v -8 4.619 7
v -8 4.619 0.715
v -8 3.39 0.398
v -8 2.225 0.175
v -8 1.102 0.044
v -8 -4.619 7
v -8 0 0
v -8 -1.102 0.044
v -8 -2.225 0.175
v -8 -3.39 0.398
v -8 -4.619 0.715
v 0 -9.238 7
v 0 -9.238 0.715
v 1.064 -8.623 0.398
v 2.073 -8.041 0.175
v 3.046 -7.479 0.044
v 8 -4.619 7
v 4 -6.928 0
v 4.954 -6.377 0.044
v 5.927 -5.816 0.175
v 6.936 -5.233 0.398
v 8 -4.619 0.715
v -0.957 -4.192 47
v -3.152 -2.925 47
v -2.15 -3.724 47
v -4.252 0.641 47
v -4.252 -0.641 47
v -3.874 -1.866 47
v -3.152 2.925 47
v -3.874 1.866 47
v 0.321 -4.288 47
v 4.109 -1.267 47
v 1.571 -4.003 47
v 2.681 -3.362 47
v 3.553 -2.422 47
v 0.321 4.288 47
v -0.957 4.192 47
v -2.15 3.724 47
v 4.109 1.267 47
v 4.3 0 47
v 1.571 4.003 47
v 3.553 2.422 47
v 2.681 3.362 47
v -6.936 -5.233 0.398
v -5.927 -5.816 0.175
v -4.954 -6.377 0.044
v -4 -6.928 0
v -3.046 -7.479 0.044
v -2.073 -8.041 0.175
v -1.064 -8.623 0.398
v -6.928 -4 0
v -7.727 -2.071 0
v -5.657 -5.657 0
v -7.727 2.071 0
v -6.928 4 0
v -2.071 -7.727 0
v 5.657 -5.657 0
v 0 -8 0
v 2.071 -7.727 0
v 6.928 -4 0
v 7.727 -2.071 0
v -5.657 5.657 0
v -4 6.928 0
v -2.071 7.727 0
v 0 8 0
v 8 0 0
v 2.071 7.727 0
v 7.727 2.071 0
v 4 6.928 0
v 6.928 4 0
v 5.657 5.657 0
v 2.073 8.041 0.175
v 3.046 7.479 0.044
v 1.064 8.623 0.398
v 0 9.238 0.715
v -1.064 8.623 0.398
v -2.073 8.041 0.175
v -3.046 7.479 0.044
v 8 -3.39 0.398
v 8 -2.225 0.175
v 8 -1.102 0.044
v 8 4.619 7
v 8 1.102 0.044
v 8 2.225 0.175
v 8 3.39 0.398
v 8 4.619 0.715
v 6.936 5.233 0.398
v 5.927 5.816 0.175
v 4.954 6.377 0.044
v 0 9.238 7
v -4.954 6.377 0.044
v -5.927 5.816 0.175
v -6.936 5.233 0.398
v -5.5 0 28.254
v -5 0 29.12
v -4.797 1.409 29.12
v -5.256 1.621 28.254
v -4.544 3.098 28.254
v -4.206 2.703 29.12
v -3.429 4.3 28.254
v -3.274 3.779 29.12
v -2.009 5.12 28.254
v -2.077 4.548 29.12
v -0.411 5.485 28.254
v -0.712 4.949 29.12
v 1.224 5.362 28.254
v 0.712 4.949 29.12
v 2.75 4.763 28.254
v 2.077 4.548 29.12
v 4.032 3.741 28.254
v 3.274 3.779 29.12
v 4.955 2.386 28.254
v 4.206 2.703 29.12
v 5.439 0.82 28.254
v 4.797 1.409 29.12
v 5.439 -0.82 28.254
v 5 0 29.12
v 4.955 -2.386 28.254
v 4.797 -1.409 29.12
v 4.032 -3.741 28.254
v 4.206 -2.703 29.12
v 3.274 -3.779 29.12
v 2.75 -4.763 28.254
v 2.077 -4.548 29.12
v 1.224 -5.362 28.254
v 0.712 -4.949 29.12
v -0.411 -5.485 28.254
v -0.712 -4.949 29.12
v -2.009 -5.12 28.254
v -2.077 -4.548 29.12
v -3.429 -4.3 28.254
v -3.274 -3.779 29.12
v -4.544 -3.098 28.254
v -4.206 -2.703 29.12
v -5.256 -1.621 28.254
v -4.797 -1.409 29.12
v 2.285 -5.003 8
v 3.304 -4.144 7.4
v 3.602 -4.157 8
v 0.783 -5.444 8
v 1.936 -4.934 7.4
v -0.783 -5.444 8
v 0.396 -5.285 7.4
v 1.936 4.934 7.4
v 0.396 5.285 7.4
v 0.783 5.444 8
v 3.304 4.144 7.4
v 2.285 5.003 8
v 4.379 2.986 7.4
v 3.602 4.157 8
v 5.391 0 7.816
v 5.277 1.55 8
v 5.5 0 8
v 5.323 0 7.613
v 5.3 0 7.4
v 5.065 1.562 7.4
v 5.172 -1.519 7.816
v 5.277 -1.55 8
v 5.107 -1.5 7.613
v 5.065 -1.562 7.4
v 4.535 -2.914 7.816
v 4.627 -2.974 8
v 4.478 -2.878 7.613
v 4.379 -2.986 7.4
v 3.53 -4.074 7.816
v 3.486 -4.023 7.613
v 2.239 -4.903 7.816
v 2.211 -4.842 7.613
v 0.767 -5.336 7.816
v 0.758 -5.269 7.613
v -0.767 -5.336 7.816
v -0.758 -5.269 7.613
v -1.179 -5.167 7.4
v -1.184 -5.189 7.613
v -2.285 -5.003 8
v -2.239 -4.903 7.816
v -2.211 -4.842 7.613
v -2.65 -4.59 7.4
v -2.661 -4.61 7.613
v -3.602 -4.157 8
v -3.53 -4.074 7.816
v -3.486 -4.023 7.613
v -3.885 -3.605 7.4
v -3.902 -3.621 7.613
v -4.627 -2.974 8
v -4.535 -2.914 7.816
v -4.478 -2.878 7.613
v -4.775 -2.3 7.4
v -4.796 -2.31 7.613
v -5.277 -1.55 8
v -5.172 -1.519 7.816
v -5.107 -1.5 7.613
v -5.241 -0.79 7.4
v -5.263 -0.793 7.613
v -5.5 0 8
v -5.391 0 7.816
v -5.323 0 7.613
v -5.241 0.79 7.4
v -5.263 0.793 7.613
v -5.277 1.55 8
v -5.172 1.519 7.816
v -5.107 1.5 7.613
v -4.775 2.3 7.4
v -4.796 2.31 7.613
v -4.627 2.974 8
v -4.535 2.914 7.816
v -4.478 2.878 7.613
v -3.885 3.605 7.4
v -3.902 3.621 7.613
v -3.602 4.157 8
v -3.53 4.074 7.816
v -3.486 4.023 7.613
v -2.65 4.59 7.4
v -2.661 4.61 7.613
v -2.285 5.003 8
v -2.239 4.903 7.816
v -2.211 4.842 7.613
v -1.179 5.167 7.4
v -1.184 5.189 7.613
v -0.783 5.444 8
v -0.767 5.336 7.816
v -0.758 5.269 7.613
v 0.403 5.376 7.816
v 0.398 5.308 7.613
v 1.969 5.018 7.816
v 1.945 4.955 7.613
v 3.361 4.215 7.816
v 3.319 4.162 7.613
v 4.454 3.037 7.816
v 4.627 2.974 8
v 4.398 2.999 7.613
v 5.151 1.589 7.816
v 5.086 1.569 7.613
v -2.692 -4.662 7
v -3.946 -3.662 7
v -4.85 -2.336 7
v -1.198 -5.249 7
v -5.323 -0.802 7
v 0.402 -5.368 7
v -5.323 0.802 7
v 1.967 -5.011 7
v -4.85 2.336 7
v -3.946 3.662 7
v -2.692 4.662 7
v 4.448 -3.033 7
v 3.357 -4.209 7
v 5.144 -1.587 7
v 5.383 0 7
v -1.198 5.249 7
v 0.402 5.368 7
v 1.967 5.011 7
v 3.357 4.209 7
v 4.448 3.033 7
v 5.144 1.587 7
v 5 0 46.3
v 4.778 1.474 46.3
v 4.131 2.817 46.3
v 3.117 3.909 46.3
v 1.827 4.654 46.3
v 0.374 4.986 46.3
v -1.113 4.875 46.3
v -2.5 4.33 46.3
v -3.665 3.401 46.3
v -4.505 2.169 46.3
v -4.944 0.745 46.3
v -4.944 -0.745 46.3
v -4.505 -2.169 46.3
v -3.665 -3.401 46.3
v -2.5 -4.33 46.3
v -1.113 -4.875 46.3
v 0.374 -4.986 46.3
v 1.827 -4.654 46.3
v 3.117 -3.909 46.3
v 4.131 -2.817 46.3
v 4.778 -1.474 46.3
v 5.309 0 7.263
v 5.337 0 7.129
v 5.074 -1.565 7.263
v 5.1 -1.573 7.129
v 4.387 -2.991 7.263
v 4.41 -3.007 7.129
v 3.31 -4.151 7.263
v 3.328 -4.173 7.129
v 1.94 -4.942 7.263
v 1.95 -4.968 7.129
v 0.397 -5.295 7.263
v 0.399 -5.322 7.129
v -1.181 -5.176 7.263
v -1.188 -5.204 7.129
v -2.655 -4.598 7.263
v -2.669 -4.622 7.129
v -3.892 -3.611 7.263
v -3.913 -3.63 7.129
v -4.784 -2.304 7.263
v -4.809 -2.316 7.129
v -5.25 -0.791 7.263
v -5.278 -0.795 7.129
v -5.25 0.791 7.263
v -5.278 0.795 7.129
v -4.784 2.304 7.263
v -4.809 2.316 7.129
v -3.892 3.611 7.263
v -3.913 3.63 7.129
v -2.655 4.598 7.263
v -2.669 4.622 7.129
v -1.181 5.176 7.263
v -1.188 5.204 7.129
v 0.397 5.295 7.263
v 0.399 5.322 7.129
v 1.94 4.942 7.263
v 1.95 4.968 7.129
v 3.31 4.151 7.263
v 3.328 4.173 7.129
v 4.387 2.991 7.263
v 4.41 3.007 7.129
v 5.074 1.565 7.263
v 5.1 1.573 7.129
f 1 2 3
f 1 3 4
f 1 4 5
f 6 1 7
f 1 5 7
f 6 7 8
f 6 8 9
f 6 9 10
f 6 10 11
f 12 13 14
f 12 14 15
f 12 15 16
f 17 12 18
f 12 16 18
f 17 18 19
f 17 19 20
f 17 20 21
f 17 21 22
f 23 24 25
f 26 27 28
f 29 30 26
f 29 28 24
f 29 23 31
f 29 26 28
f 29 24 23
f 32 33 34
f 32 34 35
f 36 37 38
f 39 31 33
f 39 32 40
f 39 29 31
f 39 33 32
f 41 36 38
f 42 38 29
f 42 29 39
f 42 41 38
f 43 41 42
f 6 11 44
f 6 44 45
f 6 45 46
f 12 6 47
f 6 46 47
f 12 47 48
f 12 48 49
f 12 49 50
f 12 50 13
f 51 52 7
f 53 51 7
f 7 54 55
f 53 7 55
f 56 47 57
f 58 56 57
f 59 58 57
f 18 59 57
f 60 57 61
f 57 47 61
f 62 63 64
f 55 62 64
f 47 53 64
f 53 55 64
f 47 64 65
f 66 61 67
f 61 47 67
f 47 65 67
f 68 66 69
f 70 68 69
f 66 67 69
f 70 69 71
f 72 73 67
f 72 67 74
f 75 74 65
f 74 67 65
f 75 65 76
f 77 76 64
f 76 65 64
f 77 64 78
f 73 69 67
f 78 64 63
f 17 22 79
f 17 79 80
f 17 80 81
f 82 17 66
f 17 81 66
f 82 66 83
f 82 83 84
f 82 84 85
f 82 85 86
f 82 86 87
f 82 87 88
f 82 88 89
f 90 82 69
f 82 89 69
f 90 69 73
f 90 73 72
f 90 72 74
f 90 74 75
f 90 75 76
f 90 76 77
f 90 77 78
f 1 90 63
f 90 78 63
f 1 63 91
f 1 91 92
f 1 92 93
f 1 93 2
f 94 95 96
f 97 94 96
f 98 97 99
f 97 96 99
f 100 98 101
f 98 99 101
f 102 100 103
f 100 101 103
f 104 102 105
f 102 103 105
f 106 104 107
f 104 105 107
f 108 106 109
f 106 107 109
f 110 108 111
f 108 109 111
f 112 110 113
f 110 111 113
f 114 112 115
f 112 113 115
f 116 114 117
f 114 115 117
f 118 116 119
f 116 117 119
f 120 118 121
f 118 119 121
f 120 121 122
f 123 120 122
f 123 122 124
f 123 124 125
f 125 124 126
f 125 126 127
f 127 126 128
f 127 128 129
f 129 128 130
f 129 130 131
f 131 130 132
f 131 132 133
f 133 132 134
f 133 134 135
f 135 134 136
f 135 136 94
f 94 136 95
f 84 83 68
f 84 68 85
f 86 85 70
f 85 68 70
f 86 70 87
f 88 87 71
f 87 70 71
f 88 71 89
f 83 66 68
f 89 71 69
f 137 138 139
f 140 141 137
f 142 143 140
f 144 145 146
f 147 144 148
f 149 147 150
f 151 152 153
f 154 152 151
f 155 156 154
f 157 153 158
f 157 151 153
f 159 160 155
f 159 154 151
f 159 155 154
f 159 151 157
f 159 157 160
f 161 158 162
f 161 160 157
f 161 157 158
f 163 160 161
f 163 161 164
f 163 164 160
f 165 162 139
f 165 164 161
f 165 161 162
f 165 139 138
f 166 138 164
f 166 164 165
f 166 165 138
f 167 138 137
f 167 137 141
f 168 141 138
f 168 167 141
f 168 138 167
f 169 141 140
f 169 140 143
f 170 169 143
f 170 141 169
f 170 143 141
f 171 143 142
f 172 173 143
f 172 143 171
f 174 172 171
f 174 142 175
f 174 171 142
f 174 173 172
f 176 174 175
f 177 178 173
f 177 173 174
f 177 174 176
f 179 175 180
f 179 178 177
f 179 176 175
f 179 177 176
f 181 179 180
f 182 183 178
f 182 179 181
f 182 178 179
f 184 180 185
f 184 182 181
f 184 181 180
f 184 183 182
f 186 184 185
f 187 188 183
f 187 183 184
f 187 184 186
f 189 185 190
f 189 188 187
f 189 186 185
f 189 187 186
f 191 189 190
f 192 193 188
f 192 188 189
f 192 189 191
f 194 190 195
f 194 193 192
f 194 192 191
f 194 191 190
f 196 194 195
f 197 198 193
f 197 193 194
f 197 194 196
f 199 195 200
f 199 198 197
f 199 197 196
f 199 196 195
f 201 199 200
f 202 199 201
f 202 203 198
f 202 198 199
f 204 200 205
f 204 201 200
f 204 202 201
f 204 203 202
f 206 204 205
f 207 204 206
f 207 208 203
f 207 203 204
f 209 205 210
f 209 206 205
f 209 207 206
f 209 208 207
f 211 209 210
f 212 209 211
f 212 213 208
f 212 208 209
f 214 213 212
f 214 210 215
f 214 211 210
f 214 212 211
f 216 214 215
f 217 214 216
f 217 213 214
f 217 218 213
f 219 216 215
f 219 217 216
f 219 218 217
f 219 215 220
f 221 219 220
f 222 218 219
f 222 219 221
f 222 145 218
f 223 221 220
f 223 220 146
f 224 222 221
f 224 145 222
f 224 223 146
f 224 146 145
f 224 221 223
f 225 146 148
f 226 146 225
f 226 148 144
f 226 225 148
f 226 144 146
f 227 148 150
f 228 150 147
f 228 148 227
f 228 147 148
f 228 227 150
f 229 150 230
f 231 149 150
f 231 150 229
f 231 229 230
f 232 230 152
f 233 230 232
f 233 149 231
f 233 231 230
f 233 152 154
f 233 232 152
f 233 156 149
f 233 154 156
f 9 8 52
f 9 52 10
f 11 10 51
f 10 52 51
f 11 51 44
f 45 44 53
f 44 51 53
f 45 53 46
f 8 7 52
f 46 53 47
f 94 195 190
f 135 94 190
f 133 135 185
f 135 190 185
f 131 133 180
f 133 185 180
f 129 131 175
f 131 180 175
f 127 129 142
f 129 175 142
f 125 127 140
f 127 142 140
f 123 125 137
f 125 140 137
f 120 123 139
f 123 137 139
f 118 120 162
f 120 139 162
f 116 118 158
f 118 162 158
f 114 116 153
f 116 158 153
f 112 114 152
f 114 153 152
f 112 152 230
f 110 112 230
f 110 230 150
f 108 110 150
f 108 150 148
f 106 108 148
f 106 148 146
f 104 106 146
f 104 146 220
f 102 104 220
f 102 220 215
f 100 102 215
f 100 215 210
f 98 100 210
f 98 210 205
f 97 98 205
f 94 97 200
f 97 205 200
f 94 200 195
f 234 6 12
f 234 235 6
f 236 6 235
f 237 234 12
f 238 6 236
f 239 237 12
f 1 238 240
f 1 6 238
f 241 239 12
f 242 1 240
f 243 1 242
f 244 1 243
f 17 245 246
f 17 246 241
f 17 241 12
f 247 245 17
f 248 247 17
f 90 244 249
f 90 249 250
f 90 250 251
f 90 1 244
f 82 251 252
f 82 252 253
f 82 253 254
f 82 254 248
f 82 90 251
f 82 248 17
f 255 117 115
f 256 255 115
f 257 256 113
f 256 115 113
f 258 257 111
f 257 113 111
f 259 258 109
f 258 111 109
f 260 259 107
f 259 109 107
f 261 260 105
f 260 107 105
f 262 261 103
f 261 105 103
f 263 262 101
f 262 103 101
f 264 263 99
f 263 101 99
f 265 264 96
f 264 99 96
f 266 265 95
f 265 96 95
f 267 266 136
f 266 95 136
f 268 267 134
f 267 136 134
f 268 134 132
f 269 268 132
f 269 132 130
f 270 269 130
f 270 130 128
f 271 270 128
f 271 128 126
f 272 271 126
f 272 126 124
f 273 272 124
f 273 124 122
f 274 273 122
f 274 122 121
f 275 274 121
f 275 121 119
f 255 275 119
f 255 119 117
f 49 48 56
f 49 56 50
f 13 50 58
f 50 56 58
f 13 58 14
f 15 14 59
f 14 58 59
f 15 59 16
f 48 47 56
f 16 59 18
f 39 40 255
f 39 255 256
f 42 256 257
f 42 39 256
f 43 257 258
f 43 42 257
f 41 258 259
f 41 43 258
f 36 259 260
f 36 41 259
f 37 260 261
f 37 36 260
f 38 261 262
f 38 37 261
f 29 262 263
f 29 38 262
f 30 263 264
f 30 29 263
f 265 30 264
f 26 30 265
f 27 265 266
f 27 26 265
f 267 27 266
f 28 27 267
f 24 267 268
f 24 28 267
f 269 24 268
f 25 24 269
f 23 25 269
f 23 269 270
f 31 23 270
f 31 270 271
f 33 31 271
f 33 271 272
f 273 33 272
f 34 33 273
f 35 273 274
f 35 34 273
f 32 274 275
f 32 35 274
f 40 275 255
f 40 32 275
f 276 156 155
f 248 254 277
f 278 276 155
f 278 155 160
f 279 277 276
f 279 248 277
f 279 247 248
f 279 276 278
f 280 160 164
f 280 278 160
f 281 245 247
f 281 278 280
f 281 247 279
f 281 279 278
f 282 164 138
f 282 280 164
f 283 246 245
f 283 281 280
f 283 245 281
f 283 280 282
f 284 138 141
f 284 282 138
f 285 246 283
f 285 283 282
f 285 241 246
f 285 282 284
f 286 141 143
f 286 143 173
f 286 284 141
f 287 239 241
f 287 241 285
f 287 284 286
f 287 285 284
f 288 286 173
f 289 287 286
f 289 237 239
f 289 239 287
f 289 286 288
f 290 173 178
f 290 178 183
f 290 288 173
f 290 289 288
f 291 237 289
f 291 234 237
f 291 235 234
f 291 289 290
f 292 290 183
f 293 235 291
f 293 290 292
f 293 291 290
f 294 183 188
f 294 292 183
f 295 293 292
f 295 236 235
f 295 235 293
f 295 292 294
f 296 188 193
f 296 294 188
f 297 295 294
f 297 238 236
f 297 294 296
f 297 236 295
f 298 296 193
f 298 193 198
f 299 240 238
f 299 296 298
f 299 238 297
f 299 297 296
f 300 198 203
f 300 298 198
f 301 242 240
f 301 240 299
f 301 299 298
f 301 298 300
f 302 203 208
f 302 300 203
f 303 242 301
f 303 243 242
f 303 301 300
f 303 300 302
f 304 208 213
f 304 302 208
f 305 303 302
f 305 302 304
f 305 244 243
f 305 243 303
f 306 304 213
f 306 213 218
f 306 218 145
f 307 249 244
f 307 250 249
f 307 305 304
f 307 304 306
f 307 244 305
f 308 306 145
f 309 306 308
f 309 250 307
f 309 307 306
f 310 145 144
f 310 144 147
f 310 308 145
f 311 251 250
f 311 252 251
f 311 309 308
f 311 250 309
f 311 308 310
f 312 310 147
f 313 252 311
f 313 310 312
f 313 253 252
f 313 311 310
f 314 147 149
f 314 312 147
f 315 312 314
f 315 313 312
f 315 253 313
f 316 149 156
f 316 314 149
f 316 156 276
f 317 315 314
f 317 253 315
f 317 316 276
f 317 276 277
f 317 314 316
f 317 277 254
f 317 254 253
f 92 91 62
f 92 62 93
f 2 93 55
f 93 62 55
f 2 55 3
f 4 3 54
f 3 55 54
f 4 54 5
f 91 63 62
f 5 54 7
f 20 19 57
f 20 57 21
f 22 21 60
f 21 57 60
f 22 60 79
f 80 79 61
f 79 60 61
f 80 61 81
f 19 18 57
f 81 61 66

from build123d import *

# Parameters (mm, degrees)
VYSUNOUT1_DEPTH = 7
SKICA5_R        = 5
VYSUNOUT4_DEPTH = 40
ZKOSIT1_SIZE    = 0.7
SKICA3_R        = 5.3
VYSUNOUT2_DEPTH = 1
SKICA4_R        = 5.5
VYSUNOUT3_DEPTH = 21.12


with BuildPart() as part:
    # Skica1 → Vysunout1 (new body)
    with BuildSketch(Plane.XY):
        Polygon((8, -4.618802154), (8, 4.618802154), (0, 9.237604307), (-8, 4.618802154), (-8, -4.618802154), (0, -9.237604307), align=None)
    extrude(amount=VYSUNOUT1_DEPTH)

    # Skica2 → Odebrat otočením1 (revolve, cut)
    with BuildSketch(Plane(origin=(0, 0, 0), x_dir=(1, 0, 0), z_dir=(0, 1, 0))):
        Polygon((8, 0), (20.124355653, 0), (20.124355653, -7), align=None)
    revolve(axis=Axis((0, 0, 0), (0, 0, 1)), mode=Mode.SUBTRACT)

    # Skica5 → Vysunout4 (add)
    with BuildSketch(Plane.XY.offset(7)):
        Circle(SKICA5_R)
    extrude(amount=VYSUNOUT4_DEPTH)

    # Zkosit1
    zkosit1_edges = [part.edges().sort_by_distance(p)[0] for p in [
        (-5, 0, 47),
    ]]
    chamfer(zkosit1_edges, length=ZKOSIT1_SIZE)

    # Skica3 → Vysunout2 (add)
    with BuildSketch(Plane.XY.offset(7)):
        Circle(SKICA3_R)
    extrude(amount=VYSUNOUT2_DEPTH)

    # Skica4 → Vysunout3 (add)
    with BuildSketch(Plane.XY.offset(8)):
        with Locations(Location((0, 0, 0), (0, 0, 180))):
            Circle(SKICA4_R)
    extrude(amount=VYSUNOUT3_DEPTH)

    # Skica6 → Odebrat otočením2 (revolve, cut)
    with BuildSketch(Plane(origin=(0, 0, 0), x_dir=(1, 0, 0), z_dir=(0, 1, 0))):
        Polygon((-5.5, -29.12), (-5.5, -28.253974596), (-5, -29.12), align=None)
    revolve(axis=Axis((0, 0, 29.12), (0, 0, -1)), mode=Mode.SUBTRACT)

    # Skica7 → Otočit kolem osy1 (revolve)
    with BuildSketch(Plane(origin=(0, 0, 0), x_dir=(1, 0, 0), z_dir=(0, 1, 0))):
        with BuildLine():
            ThreePointArc((5.3, -7.4), (5.321093687, -7.195690356), (5.383484861, -7))
            Line((5.383484861, -7), (5.3, -7))
            Line((5.3, -7), (5.3, -7.4))
        make_face()
        with BuildLine():
            ThreePointArc((5.5, -8), (5.351316702, -7.716227766), (5.3, -7.4))
            Line((5.3, -7.4), (5.3, -8))
            Line((5.3, -8), (5.5, -8))
        make_face()
    revolve(axis=Axis((0, 0, 28.253974596), (0, 0, -1)))


solid = part.part
